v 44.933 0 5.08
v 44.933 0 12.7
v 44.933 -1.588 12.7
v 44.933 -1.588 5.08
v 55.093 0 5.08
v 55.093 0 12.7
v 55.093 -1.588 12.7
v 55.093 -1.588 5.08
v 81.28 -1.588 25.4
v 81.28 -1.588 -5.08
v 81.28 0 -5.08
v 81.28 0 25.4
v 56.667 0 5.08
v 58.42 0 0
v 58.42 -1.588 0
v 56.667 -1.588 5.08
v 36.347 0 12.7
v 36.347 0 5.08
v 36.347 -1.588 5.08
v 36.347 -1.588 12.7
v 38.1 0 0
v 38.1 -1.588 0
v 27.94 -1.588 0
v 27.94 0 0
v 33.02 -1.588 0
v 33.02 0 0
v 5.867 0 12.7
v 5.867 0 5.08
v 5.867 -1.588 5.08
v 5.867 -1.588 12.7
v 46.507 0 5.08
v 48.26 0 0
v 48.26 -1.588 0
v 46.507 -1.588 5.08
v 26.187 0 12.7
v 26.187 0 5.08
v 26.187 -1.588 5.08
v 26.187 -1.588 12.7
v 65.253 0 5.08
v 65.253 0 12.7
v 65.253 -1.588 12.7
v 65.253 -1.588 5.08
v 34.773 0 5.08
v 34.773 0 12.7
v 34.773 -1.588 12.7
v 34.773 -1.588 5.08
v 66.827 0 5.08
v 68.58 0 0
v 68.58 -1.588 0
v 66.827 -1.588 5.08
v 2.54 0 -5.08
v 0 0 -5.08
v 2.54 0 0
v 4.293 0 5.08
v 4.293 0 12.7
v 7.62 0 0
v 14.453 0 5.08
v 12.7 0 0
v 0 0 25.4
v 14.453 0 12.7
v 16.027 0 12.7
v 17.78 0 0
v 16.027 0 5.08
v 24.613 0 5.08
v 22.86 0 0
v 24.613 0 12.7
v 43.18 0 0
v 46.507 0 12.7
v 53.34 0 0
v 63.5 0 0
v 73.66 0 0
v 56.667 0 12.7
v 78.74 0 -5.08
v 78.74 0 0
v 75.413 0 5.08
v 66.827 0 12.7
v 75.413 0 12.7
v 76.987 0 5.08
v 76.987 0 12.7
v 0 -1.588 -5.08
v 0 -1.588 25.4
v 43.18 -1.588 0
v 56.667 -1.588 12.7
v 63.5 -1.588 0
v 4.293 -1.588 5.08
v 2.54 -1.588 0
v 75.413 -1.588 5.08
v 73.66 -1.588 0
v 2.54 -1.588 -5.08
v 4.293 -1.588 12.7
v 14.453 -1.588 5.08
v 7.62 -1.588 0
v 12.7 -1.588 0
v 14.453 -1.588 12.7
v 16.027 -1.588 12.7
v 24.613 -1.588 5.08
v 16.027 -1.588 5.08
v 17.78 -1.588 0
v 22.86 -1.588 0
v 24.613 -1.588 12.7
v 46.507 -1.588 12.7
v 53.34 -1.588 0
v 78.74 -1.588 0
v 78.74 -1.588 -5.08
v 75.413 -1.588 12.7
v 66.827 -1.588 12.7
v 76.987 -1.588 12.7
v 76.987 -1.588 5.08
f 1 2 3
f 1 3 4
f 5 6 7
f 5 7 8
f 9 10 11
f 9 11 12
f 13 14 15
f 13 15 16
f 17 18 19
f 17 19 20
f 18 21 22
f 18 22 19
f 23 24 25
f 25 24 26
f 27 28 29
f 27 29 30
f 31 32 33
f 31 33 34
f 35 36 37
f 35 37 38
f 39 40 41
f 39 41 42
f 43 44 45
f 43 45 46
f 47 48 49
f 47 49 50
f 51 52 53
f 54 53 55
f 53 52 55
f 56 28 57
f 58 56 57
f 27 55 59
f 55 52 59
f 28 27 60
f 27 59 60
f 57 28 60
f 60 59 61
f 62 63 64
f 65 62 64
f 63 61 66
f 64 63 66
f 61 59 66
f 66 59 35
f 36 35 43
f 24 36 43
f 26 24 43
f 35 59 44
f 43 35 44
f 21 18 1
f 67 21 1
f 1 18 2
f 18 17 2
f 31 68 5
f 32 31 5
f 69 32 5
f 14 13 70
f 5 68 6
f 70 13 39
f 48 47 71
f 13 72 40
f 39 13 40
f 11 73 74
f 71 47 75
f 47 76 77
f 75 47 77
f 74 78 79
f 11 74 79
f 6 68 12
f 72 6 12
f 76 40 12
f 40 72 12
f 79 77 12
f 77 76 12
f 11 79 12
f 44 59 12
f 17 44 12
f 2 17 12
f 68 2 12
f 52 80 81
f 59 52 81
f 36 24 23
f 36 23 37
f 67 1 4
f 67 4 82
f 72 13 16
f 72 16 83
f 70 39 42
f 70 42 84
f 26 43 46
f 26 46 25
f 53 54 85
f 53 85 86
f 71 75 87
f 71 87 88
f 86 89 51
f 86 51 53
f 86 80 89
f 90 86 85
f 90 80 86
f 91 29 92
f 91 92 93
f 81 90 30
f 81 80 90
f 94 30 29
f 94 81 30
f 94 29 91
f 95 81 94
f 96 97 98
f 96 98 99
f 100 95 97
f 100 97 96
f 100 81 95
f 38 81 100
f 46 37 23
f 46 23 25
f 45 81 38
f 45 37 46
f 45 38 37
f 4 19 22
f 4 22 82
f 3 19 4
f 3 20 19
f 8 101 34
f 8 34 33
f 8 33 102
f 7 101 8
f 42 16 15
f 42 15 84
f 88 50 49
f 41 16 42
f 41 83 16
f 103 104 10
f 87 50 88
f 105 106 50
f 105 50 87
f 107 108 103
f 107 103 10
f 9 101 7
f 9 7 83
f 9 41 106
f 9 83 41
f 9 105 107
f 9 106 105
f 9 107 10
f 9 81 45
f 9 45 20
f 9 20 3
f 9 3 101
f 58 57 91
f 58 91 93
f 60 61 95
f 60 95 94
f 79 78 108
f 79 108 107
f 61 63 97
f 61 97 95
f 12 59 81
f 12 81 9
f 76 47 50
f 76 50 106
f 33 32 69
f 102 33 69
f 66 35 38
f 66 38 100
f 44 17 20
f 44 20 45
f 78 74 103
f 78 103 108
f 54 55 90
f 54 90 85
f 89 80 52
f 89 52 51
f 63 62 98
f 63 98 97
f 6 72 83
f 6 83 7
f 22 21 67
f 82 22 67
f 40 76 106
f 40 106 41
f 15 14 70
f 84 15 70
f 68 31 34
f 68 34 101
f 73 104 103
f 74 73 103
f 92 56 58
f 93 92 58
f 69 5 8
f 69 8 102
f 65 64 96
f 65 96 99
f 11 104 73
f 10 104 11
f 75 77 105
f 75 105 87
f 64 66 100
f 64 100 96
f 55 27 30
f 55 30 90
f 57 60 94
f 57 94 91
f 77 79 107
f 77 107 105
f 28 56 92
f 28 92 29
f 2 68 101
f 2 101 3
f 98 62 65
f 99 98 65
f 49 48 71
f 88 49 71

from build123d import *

# Parameters (mm, degrees)
F0_W     = 152.4
F0_H     = 25.4
F1_DEPTH = 1.5875
F3_DEPTH = 1.5885
F4_W     = 71.12
F4_H     = 25.4
F5_DEPTH = 1.5885
F6_W     = 2.54
F6_H     = 5.08
F7_DEPTH = 1.5875


with BuildPart() as f1:
    # F0 (on Front) → F1 (new body)
    with BuildSketch(Plane.XZ):
        with Locations((76.2, 12.7)):
            Rectangle(F0_W, F0_H)
    extrude(amount=F1_DEPTH)

    # F2 (on Front) → F3 (cut, through all)
    with BuildSketch(Plane.XZ):
        Polygon((4.2926, 5.08), (2.54, 0), (7.62, 0), (5.8674, 5.08), (5.8674, 12.7), (4.2926, 12.7), align=None)
        Polygon((14.4526, 5.08), (12.7, 0), (17.78, 0), (16.0274, 5.08), (16.0274, 12.7), (14.4526, 12.7), align=None)
        Polygon((24.6126, 5.08), (22.86, 0), (27.94, 0), (26.1874, 5.08), (26.1874, 12.7), (24.6126, 12.7), align=None)
        Polygon((34.7726, 5.08), (33.02, 0), (38.1, 0), (36.3474, 5.08), (36.3474, 12.7), (34.7726, 12.7), align=None)
        Polygon((44.9326, 5.08), (43.18, 0), (48.26, 0), (46.5074, 5.08), (46.5074, 12.7), (44.9326, 12.7), align=None)
        Polygon((55.0926, 5.08), (53.34, 0), (58.42, 0), (56.6674, 5.08), (56.6674, 12.7), (55.0926, 12.7), align=None)
        Polygon((65.2526, 5.08), (63.5, 0), (68.58, 0), (66.8274, 5.08), (66.8274, 12.7), (65.2526, 12.7), align=None)
        Polygon((75.4126, 5.08), (73.66, 0), (78.74, 0), (76.9874, 5.08), (76.9874, 12.7), (75.4126, 12.7), align=None)
    extrude(amount=F3_DEPTH, mode=Mode.SUBTRACT)

    # F4 (on face) → F5 (cut, through all)
    with BuildSketch(Plane.XZ.offset(1.5875)):
        with Locations((116.84, 12.7)):
            Rectangle(F4_W, F4_H)
    extrude(amount=-F5_DEPTH, mode=Mode.SUBTRACT)

    # F6 (on face) → F7 (join, through all)
    with BuildSketch(Plane.XZ.offset(1.5875)):
        with Locations((1.27, -2.54)):
            Rectangle(F6_W, F6_H)
        with Locations((80.01, -2.54)):
            Rectangle(F6_W, F6_H)
    extrude(amount=-F7_DEPTH)


solid = f1.part
